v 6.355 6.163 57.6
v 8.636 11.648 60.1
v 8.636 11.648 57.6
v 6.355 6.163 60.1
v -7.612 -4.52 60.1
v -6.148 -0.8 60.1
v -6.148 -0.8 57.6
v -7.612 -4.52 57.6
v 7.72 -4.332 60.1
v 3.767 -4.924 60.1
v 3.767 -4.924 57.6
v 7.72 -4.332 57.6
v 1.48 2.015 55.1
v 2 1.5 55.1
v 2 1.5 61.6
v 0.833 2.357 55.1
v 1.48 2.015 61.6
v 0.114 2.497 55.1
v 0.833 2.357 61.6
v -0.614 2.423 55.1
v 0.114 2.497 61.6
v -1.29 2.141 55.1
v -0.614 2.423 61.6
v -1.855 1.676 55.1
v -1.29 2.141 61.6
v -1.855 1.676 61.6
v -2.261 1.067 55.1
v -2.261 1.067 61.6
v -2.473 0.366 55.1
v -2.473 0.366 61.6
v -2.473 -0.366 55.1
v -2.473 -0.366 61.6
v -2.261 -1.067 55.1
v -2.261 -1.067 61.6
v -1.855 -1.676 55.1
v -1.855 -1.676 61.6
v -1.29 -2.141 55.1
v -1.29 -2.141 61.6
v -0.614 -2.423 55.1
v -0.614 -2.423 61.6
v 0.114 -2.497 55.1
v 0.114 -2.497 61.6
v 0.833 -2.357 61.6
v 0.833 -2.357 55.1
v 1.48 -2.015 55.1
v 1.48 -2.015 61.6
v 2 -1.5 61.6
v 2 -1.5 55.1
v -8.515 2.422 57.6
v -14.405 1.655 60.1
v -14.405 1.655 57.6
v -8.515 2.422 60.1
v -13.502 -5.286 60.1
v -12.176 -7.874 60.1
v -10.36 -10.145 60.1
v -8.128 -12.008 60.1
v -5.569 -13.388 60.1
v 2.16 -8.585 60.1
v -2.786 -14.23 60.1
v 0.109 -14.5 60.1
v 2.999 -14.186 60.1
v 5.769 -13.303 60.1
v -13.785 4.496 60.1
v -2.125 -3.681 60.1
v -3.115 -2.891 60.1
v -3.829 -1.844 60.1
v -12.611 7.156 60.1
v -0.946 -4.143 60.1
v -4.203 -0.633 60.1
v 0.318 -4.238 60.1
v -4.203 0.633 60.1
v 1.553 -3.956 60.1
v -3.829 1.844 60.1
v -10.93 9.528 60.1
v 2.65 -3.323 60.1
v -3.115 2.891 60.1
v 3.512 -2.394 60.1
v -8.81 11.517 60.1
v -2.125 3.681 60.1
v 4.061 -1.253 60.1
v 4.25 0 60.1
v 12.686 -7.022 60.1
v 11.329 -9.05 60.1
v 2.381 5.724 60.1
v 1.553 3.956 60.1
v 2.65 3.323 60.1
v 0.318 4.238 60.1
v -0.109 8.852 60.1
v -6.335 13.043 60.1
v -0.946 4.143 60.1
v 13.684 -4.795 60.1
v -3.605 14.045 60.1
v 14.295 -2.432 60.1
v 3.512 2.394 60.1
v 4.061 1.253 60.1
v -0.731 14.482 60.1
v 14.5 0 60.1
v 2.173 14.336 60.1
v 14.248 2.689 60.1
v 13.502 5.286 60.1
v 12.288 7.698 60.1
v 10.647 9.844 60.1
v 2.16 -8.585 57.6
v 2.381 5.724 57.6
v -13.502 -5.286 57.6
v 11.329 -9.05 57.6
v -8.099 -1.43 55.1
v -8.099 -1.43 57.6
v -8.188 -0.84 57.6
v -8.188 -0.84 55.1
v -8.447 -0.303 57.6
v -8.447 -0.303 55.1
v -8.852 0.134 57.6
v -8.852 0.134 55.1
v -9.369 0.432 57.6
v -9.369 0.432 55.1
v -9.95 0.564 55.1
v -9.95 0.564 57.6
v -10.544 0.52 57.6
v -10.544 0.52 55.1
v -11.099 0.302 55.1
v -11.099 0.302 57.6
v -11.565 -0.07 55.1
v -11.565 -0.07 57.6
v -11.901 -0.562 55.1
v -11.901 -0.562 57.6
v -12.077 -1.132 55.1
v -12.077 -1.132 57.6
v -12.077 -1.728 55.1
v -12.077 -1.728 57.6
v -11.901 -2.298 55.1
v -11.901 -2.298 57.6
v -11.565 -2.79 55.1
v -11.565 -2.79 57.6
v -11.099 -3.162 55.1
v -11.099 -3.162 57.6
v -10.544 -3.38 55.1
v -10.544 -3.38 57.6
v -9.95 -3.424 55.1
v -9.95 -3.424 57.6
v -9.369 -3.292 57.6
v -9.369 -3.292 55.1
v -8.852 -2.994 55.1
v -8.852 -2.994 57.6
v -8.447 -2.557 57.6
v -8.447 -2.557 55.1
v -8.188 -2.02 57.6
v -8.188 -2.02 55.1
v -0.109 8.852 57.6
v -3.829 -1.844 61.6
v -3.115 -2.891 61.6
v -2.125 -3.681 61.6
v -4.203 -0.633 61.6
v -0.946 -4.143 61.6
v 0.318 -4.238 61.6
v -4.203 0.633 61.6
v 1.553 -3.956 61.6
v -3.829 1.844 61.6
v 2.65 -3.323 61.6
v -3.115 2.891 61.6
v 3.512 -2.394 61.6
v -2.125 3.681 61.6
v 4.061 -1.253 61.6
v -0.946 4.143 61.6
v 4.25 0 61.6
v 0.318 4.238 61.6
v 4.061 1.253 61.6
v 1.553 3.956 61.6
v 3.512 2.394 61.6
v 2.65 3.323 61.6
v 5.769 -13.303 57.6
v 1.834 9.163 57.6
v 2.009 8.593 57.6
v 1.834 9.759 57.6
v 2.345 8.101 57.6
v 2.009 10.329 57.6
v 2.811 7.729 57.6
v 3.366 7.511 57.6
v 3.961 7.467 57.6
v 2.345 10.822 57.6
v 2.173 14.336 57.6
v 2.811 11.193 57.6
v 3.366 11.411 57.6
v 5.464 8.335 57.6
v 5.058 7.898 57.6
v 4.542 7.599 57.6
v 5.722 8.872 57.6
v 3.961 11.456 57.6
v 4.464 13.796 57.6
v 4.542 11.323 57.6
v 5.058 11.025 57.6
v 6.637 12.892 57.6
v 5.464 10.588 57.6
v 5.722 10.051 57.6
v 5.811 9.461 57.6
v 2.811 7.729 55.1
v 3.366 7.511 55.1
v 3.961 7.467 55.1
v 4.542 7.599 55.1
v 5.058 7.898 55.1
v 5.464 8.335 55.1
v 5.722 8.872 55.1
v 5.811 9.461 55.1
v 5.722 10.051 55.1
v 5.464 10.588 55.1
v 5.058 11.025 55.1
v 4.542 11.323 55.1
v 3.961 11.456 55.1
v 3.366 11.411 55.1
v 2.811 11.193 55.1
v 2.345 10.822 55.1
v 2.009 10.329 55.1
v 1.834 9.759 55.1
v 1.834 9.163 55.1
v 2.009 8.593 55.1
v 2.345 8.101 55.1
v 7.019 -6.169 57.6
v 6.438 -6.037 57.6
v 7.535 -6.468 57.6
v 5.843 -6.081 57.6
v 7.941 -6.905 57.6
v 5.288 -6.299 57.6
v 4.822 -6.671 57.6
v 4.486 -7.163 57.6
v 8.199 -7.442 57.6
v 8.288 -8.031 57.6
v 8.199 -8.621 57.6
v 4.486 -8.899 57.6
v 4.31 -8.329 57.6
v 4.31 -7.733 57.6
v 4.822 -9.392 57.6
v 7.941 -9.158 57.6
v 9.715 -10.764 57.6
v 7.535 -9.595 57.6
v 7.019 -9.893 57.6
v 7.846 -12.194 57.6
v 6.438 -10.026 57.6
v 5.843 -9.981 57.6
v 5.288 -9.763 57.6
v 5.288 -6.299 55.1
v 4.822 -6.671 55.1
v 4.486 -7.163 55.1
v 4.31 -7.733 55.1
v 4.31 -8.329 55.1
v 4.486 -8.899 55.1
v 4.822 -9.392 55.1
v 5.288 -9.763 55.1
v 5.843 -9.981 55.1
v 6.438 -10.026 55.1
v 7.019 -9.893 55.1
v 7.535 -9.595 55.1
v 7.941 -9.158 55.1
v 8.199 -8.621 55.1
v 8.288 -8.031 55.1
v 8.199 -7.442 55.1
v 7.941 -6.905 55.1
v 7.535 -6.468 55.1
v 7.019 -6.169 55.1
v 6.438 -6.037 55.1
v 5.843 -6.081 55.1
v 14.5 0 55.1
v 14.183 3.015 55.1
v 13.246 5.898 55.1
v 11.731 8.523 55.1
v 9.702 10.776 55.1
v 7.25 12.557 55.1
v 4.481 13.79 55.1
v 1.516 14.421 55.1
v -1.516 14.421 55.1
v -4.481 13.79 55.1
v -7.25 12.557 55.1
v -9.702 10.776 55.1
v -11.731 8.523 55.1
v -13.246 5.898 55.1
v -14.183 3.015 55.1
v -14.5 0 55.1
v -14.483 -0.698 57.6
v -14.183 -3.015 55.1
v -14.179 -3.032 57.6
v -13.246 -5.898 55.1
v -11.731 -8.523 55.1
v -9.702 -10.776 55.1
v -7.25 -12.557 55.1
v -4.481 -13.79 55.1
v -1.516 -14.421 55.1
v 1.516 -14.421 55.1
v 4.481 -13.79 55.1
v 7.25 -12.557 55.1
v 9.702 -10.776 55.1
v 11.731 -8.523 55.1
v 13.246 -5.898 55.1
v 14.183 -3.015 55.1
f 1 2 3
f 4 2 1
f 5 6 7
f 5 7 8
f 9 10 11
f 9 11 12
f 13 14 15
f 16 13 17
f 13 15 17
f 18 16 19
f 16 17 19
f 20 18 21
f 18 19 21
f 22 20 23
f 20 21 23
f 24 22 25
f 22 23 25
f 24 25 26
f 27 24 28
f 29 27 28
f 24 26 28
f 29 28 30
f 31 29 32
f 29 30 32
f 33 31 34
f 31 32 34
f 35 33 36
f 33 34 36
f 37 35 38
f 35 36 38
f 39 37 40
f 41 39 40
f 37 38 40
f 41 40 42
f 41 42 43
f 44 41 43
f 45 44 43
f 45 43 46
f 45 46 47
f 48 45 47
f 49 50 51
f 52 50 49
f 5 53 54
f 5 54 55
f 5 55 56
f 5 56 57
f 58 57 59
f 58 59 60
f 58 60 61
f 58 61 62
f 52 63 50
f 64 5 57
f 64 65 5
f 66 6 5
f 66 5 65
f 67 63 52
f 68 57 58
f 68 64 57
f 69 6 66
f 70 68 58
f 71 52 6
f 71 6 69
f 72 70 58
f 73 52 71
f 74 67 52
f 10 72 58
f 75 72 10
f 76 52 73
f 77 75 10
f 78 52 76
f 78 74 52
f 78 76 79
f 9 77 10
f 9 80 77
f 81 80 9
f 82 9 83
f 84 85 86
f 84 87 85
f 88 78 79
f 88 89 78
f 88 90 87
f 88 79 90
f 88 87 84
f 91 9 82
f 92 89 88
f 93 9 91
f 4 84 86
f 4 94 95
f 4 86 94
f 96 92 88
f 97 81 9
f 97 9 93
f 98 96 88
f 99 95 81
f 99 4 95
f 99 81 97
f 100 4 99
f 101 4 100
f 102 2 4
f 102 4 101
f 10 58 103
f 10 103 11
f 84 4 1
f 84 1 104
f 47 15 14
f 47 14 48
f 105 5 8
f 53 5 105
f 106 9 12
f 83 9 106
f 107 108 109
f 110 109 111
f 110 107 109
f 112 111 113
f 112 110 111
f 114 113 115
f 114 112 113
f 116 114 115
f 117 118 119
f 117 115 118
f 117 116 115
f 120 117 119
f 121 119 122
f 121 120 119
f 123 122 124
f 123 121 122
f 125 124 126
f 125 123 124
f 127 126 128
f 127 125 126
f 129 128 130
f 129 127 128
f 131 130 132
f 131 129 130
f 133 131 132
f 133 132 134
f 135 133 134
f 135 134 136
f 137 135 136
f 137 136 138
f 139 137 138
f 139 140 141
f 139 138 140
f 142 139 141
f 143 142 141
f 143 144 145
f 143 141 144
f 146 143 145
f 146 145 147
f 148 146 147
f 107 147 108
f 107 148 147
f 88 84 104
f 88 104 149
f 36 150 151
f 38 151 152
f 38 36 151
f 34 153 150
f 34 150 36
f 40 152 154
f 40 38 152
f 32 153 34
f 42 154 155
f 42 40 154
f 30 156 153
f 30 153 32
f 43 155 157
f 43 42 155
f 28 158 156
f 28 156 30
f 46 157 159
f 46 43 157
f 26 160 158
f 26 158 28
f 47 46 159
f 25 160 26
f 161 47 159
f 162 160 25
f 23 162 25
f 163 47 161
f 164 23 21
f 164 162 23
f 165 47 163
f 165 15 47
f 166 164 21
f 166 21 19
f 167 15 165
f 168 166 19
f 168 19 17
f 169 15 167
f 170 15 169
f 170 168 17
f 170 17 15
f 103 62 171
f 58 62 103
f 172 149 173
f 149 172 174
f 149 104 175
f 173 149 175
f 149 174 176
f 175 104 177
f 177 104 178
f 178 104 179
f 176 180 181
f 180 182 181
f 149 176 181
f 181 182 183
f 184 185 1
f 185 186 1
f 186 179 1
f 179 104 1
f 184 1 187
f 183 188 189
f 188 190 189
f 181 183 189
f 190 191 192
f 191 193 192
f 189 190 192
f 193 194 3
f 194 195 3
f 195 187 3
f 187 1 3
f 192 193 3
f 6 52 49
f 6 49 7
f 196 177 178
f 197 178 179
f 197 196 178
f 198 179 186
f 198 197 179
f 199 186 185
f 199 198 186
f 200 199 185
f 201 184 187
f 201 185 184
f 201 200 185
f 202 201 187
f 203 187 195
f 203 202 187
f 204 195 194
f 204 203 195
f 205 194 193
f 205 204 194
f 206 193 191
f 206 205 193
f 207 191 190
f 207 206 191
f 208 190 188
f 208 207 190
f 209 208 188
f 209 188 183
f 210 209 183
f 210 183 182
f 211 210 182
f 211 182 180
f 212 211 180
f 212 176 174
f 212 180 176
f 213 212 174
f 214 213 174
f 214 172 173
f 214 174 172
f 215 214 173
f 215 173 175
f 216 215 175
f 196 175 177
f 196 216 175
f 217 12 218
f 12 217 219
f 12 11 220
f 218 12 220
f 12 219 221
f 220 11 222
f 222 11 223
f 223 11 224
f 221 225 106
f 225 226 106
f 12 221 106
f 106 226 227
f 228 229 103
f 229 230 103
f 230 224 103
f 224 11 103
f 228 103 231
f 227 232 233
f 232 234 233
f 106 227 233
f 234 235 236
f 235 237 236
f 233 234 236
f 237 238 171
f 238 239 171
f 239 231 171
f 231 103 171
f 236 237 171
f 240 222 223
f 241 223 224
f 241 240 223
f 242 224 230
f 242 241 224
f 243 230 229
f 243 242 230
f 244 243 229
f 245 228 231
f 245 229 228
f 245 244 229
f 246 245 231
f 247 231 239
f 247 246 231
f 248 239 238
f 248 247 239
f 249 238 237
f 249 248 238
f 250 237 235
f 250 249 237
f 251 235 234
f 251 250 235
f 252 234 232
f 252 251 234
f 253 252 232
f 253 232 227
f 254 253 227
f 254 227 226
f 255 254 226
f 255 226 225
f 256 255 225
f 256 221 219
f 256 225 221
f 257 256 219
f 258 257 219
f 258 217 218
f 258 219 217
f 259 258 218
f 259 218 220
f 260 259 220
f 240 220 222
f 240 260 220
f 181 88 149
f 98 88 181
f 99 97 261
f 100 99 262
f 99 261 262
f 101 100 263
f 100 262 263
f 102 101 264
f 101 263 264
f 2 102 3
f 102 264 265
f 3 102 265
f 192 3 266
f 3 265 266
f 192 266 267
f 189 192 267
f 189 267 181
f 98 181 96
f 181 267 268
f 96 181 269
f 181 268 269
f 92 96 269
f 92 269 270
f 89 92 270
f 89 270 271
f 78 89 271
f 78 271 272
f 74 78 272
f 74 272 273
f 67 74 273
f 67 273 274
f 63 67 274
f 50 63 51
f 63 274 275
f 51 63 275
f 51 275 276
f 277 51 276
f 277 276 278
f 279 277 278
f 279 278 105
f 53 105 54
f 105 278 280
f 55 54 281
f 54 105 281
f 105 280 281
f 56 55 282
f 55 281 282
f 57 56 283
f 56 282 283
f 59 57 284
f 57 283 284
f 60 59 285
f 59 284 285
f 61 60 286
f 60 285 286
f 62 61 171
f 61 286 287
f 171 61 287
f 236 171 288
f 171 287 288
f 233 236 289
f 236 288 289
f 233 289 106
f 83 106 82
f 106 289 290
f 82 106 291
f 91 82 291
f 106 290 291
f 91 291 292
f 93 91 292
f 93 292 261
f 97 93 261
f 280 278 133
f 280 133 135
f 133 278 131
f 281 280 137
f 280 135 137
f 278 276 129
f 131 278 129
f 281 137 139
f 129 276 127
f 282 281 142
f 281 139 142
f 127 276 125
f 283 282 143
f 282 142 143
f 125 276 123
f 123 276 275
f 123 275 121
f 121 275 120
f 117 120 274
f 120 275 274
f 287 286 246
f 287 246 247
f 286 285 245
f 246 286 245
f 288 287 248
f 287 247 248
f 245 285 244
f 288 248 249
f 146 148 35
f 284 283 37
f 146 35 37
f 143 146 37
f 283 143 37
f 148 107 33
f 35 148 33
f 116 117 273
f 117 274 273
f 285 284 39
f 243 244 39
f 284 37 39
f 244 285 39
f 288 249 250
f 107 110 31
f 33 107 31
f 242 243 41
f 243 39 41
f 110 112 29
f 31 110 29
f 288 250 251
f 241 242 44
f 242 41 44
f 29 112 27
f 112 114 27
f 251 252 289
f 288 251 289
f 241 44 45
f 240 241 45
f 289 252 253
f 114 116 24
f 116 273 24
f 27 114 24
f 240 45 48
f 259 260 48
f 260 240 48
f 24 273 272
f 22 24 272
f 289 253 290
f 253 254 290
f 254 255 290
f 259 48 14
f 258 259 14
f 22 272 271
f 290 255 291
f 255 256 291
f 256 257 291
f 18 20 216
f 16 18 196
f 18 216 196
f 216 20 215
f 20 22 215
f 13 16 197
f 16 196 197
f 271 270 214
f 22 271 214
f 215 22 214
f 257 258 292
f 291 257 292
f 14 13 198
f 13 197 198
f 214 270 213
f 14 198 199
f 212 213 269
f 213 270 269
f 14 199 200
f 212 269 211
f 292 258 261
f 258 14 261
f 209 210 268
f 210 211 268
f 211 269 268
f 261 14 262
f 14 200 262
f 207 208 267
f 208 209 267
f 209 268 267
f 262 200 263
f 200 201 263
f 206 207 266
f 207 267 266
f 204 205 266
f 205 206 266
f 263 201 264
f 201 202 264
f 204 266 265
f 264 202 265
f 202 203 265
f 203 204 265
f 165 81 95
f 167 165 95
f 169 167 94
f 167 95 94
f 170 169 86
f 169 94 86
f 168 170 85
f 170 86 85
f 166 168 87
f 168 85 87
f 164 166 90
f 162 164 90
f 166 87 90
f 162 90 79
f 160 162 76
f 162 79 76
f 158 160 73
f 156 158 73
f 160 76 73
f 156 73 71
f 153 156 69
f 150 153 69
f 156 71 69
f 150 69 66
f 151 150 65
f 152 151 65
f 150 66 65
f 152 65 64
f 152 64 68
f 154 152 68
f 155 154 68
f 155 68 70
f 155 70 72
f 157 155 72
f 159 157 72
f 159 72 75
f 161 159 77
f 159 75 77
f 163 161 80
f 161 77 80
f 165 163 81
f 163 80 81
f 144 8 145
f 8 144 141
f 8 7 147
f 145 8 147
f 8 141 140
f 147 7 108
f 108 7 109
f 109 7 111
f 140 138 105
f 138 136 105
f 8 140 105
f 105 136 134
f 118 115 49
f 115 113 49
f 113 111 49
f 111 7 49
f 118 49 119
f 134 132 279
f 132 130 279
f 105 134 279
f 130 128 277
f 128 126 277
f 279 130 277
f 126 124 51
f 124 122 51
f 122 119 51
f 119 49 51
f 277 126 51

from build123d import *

# Parameters (mm, degrees)
SKETCH039_R           = 14.5
PAD016_DEPTH          = 5
POCKET022_DEPTH       = 2.5
SKETCH041_R           = 2
POCKET023_DEPTH       = 87.6327130405
POLARPATTERN001_COUNT = 3
SKETCH042_R           = 4.25
PAD017_DEPTH          = 1.5
POCKET024_DEPTH       = 5.001
POCKET024_DEPTH_BACK  = 1.501


with BuildPart() as part:
    # Sketch039 → Pad016 (new body)
    with BuildSketch(Plane.XY.offset(55.1)):
        Circle(SKETCH039_R)
    extrude(amount=PAD016_DEPTH)

    # Sketch040 → Pocket022 (cut)
    with BuildSketch(Plane.XY.offset(60.1)):
        with BuildLine():
            Line((-14.4052301376, 1.6550965782), (-8.5148861812, 2.4215481911))
            Line((-8.5148861812, 2.4215481911), (-6.1481704596, -0.8))
            Line((-6.1481704596, -0.8), (-7.6116603747, -4.5199345858))
            Line((-7.6116603747, -4.5199345858), (-13.5020043311, -5.2863861987))
            ThreePointArc((-14.4052301376, 1.6550965782), (-14.3787857522, -1.8709677419), (-13.5020043311, -5.2863861987))
        make_face()
    pocket022 = extrude(amount=-POCKET022_DEPTH, mode=Mode.SUBTRACT)

    # Sketch041 → Pocket023 (cut, through all)
    with BuildSketch(Plane.XY.offset(55.1)):
        with Locations((-10.0992623493, -1.43)):
            Circle(SKETCH041_R)
    pocket023 = extrude(amount=POCKET023_DEPTH, mode=Mode.SUBTRACT)

    # PolarPattern001: Pocket023, Pocket022 ×3 about axis
    polarpattern001_axis = Axis((0, 0, 55.1), (0, 0, 1))
    for i in range(1, POLARPATTERN001_COUNT):
        add(pocket023.rotate(polarpattern001_axis, i * 360 / POLARPATTERN001_COUNT), mode=Mode.SUBTRACT)
        add(pocket022.rotate(polarpattern001_axis, i * 360 / POLARPATTERN001_COUNT), mode=Mode.SUBTRACT)

    # Sketch042 → Pad017 (join)
    with BuildSketch(Plane.XY.offset(60.1)):
        Circle(SKETCH042_R)
    extrude(amount=PAD017_DEPTH)

    # Sketch043 → Pocket024 (cut, two sides)
    with BuildSketch(Plane.XY.offset(60.1)) as pocket024_sk:
        with BuildLine():
            Line((2, 1.5), (2, -1.5))
            ThreePointArc((2, 1.5), (-2.5, 0), (2, -1.5))
        make_face()
    extrude(amount=-POCKET024_DEPTH, mode=Mode.SUBTRACT)
    extrude(pocket024_sk.sketch, amount=POCKET024_DEPTH_BACK, mode=Mode.SUBTRACT)


solid = part.part
